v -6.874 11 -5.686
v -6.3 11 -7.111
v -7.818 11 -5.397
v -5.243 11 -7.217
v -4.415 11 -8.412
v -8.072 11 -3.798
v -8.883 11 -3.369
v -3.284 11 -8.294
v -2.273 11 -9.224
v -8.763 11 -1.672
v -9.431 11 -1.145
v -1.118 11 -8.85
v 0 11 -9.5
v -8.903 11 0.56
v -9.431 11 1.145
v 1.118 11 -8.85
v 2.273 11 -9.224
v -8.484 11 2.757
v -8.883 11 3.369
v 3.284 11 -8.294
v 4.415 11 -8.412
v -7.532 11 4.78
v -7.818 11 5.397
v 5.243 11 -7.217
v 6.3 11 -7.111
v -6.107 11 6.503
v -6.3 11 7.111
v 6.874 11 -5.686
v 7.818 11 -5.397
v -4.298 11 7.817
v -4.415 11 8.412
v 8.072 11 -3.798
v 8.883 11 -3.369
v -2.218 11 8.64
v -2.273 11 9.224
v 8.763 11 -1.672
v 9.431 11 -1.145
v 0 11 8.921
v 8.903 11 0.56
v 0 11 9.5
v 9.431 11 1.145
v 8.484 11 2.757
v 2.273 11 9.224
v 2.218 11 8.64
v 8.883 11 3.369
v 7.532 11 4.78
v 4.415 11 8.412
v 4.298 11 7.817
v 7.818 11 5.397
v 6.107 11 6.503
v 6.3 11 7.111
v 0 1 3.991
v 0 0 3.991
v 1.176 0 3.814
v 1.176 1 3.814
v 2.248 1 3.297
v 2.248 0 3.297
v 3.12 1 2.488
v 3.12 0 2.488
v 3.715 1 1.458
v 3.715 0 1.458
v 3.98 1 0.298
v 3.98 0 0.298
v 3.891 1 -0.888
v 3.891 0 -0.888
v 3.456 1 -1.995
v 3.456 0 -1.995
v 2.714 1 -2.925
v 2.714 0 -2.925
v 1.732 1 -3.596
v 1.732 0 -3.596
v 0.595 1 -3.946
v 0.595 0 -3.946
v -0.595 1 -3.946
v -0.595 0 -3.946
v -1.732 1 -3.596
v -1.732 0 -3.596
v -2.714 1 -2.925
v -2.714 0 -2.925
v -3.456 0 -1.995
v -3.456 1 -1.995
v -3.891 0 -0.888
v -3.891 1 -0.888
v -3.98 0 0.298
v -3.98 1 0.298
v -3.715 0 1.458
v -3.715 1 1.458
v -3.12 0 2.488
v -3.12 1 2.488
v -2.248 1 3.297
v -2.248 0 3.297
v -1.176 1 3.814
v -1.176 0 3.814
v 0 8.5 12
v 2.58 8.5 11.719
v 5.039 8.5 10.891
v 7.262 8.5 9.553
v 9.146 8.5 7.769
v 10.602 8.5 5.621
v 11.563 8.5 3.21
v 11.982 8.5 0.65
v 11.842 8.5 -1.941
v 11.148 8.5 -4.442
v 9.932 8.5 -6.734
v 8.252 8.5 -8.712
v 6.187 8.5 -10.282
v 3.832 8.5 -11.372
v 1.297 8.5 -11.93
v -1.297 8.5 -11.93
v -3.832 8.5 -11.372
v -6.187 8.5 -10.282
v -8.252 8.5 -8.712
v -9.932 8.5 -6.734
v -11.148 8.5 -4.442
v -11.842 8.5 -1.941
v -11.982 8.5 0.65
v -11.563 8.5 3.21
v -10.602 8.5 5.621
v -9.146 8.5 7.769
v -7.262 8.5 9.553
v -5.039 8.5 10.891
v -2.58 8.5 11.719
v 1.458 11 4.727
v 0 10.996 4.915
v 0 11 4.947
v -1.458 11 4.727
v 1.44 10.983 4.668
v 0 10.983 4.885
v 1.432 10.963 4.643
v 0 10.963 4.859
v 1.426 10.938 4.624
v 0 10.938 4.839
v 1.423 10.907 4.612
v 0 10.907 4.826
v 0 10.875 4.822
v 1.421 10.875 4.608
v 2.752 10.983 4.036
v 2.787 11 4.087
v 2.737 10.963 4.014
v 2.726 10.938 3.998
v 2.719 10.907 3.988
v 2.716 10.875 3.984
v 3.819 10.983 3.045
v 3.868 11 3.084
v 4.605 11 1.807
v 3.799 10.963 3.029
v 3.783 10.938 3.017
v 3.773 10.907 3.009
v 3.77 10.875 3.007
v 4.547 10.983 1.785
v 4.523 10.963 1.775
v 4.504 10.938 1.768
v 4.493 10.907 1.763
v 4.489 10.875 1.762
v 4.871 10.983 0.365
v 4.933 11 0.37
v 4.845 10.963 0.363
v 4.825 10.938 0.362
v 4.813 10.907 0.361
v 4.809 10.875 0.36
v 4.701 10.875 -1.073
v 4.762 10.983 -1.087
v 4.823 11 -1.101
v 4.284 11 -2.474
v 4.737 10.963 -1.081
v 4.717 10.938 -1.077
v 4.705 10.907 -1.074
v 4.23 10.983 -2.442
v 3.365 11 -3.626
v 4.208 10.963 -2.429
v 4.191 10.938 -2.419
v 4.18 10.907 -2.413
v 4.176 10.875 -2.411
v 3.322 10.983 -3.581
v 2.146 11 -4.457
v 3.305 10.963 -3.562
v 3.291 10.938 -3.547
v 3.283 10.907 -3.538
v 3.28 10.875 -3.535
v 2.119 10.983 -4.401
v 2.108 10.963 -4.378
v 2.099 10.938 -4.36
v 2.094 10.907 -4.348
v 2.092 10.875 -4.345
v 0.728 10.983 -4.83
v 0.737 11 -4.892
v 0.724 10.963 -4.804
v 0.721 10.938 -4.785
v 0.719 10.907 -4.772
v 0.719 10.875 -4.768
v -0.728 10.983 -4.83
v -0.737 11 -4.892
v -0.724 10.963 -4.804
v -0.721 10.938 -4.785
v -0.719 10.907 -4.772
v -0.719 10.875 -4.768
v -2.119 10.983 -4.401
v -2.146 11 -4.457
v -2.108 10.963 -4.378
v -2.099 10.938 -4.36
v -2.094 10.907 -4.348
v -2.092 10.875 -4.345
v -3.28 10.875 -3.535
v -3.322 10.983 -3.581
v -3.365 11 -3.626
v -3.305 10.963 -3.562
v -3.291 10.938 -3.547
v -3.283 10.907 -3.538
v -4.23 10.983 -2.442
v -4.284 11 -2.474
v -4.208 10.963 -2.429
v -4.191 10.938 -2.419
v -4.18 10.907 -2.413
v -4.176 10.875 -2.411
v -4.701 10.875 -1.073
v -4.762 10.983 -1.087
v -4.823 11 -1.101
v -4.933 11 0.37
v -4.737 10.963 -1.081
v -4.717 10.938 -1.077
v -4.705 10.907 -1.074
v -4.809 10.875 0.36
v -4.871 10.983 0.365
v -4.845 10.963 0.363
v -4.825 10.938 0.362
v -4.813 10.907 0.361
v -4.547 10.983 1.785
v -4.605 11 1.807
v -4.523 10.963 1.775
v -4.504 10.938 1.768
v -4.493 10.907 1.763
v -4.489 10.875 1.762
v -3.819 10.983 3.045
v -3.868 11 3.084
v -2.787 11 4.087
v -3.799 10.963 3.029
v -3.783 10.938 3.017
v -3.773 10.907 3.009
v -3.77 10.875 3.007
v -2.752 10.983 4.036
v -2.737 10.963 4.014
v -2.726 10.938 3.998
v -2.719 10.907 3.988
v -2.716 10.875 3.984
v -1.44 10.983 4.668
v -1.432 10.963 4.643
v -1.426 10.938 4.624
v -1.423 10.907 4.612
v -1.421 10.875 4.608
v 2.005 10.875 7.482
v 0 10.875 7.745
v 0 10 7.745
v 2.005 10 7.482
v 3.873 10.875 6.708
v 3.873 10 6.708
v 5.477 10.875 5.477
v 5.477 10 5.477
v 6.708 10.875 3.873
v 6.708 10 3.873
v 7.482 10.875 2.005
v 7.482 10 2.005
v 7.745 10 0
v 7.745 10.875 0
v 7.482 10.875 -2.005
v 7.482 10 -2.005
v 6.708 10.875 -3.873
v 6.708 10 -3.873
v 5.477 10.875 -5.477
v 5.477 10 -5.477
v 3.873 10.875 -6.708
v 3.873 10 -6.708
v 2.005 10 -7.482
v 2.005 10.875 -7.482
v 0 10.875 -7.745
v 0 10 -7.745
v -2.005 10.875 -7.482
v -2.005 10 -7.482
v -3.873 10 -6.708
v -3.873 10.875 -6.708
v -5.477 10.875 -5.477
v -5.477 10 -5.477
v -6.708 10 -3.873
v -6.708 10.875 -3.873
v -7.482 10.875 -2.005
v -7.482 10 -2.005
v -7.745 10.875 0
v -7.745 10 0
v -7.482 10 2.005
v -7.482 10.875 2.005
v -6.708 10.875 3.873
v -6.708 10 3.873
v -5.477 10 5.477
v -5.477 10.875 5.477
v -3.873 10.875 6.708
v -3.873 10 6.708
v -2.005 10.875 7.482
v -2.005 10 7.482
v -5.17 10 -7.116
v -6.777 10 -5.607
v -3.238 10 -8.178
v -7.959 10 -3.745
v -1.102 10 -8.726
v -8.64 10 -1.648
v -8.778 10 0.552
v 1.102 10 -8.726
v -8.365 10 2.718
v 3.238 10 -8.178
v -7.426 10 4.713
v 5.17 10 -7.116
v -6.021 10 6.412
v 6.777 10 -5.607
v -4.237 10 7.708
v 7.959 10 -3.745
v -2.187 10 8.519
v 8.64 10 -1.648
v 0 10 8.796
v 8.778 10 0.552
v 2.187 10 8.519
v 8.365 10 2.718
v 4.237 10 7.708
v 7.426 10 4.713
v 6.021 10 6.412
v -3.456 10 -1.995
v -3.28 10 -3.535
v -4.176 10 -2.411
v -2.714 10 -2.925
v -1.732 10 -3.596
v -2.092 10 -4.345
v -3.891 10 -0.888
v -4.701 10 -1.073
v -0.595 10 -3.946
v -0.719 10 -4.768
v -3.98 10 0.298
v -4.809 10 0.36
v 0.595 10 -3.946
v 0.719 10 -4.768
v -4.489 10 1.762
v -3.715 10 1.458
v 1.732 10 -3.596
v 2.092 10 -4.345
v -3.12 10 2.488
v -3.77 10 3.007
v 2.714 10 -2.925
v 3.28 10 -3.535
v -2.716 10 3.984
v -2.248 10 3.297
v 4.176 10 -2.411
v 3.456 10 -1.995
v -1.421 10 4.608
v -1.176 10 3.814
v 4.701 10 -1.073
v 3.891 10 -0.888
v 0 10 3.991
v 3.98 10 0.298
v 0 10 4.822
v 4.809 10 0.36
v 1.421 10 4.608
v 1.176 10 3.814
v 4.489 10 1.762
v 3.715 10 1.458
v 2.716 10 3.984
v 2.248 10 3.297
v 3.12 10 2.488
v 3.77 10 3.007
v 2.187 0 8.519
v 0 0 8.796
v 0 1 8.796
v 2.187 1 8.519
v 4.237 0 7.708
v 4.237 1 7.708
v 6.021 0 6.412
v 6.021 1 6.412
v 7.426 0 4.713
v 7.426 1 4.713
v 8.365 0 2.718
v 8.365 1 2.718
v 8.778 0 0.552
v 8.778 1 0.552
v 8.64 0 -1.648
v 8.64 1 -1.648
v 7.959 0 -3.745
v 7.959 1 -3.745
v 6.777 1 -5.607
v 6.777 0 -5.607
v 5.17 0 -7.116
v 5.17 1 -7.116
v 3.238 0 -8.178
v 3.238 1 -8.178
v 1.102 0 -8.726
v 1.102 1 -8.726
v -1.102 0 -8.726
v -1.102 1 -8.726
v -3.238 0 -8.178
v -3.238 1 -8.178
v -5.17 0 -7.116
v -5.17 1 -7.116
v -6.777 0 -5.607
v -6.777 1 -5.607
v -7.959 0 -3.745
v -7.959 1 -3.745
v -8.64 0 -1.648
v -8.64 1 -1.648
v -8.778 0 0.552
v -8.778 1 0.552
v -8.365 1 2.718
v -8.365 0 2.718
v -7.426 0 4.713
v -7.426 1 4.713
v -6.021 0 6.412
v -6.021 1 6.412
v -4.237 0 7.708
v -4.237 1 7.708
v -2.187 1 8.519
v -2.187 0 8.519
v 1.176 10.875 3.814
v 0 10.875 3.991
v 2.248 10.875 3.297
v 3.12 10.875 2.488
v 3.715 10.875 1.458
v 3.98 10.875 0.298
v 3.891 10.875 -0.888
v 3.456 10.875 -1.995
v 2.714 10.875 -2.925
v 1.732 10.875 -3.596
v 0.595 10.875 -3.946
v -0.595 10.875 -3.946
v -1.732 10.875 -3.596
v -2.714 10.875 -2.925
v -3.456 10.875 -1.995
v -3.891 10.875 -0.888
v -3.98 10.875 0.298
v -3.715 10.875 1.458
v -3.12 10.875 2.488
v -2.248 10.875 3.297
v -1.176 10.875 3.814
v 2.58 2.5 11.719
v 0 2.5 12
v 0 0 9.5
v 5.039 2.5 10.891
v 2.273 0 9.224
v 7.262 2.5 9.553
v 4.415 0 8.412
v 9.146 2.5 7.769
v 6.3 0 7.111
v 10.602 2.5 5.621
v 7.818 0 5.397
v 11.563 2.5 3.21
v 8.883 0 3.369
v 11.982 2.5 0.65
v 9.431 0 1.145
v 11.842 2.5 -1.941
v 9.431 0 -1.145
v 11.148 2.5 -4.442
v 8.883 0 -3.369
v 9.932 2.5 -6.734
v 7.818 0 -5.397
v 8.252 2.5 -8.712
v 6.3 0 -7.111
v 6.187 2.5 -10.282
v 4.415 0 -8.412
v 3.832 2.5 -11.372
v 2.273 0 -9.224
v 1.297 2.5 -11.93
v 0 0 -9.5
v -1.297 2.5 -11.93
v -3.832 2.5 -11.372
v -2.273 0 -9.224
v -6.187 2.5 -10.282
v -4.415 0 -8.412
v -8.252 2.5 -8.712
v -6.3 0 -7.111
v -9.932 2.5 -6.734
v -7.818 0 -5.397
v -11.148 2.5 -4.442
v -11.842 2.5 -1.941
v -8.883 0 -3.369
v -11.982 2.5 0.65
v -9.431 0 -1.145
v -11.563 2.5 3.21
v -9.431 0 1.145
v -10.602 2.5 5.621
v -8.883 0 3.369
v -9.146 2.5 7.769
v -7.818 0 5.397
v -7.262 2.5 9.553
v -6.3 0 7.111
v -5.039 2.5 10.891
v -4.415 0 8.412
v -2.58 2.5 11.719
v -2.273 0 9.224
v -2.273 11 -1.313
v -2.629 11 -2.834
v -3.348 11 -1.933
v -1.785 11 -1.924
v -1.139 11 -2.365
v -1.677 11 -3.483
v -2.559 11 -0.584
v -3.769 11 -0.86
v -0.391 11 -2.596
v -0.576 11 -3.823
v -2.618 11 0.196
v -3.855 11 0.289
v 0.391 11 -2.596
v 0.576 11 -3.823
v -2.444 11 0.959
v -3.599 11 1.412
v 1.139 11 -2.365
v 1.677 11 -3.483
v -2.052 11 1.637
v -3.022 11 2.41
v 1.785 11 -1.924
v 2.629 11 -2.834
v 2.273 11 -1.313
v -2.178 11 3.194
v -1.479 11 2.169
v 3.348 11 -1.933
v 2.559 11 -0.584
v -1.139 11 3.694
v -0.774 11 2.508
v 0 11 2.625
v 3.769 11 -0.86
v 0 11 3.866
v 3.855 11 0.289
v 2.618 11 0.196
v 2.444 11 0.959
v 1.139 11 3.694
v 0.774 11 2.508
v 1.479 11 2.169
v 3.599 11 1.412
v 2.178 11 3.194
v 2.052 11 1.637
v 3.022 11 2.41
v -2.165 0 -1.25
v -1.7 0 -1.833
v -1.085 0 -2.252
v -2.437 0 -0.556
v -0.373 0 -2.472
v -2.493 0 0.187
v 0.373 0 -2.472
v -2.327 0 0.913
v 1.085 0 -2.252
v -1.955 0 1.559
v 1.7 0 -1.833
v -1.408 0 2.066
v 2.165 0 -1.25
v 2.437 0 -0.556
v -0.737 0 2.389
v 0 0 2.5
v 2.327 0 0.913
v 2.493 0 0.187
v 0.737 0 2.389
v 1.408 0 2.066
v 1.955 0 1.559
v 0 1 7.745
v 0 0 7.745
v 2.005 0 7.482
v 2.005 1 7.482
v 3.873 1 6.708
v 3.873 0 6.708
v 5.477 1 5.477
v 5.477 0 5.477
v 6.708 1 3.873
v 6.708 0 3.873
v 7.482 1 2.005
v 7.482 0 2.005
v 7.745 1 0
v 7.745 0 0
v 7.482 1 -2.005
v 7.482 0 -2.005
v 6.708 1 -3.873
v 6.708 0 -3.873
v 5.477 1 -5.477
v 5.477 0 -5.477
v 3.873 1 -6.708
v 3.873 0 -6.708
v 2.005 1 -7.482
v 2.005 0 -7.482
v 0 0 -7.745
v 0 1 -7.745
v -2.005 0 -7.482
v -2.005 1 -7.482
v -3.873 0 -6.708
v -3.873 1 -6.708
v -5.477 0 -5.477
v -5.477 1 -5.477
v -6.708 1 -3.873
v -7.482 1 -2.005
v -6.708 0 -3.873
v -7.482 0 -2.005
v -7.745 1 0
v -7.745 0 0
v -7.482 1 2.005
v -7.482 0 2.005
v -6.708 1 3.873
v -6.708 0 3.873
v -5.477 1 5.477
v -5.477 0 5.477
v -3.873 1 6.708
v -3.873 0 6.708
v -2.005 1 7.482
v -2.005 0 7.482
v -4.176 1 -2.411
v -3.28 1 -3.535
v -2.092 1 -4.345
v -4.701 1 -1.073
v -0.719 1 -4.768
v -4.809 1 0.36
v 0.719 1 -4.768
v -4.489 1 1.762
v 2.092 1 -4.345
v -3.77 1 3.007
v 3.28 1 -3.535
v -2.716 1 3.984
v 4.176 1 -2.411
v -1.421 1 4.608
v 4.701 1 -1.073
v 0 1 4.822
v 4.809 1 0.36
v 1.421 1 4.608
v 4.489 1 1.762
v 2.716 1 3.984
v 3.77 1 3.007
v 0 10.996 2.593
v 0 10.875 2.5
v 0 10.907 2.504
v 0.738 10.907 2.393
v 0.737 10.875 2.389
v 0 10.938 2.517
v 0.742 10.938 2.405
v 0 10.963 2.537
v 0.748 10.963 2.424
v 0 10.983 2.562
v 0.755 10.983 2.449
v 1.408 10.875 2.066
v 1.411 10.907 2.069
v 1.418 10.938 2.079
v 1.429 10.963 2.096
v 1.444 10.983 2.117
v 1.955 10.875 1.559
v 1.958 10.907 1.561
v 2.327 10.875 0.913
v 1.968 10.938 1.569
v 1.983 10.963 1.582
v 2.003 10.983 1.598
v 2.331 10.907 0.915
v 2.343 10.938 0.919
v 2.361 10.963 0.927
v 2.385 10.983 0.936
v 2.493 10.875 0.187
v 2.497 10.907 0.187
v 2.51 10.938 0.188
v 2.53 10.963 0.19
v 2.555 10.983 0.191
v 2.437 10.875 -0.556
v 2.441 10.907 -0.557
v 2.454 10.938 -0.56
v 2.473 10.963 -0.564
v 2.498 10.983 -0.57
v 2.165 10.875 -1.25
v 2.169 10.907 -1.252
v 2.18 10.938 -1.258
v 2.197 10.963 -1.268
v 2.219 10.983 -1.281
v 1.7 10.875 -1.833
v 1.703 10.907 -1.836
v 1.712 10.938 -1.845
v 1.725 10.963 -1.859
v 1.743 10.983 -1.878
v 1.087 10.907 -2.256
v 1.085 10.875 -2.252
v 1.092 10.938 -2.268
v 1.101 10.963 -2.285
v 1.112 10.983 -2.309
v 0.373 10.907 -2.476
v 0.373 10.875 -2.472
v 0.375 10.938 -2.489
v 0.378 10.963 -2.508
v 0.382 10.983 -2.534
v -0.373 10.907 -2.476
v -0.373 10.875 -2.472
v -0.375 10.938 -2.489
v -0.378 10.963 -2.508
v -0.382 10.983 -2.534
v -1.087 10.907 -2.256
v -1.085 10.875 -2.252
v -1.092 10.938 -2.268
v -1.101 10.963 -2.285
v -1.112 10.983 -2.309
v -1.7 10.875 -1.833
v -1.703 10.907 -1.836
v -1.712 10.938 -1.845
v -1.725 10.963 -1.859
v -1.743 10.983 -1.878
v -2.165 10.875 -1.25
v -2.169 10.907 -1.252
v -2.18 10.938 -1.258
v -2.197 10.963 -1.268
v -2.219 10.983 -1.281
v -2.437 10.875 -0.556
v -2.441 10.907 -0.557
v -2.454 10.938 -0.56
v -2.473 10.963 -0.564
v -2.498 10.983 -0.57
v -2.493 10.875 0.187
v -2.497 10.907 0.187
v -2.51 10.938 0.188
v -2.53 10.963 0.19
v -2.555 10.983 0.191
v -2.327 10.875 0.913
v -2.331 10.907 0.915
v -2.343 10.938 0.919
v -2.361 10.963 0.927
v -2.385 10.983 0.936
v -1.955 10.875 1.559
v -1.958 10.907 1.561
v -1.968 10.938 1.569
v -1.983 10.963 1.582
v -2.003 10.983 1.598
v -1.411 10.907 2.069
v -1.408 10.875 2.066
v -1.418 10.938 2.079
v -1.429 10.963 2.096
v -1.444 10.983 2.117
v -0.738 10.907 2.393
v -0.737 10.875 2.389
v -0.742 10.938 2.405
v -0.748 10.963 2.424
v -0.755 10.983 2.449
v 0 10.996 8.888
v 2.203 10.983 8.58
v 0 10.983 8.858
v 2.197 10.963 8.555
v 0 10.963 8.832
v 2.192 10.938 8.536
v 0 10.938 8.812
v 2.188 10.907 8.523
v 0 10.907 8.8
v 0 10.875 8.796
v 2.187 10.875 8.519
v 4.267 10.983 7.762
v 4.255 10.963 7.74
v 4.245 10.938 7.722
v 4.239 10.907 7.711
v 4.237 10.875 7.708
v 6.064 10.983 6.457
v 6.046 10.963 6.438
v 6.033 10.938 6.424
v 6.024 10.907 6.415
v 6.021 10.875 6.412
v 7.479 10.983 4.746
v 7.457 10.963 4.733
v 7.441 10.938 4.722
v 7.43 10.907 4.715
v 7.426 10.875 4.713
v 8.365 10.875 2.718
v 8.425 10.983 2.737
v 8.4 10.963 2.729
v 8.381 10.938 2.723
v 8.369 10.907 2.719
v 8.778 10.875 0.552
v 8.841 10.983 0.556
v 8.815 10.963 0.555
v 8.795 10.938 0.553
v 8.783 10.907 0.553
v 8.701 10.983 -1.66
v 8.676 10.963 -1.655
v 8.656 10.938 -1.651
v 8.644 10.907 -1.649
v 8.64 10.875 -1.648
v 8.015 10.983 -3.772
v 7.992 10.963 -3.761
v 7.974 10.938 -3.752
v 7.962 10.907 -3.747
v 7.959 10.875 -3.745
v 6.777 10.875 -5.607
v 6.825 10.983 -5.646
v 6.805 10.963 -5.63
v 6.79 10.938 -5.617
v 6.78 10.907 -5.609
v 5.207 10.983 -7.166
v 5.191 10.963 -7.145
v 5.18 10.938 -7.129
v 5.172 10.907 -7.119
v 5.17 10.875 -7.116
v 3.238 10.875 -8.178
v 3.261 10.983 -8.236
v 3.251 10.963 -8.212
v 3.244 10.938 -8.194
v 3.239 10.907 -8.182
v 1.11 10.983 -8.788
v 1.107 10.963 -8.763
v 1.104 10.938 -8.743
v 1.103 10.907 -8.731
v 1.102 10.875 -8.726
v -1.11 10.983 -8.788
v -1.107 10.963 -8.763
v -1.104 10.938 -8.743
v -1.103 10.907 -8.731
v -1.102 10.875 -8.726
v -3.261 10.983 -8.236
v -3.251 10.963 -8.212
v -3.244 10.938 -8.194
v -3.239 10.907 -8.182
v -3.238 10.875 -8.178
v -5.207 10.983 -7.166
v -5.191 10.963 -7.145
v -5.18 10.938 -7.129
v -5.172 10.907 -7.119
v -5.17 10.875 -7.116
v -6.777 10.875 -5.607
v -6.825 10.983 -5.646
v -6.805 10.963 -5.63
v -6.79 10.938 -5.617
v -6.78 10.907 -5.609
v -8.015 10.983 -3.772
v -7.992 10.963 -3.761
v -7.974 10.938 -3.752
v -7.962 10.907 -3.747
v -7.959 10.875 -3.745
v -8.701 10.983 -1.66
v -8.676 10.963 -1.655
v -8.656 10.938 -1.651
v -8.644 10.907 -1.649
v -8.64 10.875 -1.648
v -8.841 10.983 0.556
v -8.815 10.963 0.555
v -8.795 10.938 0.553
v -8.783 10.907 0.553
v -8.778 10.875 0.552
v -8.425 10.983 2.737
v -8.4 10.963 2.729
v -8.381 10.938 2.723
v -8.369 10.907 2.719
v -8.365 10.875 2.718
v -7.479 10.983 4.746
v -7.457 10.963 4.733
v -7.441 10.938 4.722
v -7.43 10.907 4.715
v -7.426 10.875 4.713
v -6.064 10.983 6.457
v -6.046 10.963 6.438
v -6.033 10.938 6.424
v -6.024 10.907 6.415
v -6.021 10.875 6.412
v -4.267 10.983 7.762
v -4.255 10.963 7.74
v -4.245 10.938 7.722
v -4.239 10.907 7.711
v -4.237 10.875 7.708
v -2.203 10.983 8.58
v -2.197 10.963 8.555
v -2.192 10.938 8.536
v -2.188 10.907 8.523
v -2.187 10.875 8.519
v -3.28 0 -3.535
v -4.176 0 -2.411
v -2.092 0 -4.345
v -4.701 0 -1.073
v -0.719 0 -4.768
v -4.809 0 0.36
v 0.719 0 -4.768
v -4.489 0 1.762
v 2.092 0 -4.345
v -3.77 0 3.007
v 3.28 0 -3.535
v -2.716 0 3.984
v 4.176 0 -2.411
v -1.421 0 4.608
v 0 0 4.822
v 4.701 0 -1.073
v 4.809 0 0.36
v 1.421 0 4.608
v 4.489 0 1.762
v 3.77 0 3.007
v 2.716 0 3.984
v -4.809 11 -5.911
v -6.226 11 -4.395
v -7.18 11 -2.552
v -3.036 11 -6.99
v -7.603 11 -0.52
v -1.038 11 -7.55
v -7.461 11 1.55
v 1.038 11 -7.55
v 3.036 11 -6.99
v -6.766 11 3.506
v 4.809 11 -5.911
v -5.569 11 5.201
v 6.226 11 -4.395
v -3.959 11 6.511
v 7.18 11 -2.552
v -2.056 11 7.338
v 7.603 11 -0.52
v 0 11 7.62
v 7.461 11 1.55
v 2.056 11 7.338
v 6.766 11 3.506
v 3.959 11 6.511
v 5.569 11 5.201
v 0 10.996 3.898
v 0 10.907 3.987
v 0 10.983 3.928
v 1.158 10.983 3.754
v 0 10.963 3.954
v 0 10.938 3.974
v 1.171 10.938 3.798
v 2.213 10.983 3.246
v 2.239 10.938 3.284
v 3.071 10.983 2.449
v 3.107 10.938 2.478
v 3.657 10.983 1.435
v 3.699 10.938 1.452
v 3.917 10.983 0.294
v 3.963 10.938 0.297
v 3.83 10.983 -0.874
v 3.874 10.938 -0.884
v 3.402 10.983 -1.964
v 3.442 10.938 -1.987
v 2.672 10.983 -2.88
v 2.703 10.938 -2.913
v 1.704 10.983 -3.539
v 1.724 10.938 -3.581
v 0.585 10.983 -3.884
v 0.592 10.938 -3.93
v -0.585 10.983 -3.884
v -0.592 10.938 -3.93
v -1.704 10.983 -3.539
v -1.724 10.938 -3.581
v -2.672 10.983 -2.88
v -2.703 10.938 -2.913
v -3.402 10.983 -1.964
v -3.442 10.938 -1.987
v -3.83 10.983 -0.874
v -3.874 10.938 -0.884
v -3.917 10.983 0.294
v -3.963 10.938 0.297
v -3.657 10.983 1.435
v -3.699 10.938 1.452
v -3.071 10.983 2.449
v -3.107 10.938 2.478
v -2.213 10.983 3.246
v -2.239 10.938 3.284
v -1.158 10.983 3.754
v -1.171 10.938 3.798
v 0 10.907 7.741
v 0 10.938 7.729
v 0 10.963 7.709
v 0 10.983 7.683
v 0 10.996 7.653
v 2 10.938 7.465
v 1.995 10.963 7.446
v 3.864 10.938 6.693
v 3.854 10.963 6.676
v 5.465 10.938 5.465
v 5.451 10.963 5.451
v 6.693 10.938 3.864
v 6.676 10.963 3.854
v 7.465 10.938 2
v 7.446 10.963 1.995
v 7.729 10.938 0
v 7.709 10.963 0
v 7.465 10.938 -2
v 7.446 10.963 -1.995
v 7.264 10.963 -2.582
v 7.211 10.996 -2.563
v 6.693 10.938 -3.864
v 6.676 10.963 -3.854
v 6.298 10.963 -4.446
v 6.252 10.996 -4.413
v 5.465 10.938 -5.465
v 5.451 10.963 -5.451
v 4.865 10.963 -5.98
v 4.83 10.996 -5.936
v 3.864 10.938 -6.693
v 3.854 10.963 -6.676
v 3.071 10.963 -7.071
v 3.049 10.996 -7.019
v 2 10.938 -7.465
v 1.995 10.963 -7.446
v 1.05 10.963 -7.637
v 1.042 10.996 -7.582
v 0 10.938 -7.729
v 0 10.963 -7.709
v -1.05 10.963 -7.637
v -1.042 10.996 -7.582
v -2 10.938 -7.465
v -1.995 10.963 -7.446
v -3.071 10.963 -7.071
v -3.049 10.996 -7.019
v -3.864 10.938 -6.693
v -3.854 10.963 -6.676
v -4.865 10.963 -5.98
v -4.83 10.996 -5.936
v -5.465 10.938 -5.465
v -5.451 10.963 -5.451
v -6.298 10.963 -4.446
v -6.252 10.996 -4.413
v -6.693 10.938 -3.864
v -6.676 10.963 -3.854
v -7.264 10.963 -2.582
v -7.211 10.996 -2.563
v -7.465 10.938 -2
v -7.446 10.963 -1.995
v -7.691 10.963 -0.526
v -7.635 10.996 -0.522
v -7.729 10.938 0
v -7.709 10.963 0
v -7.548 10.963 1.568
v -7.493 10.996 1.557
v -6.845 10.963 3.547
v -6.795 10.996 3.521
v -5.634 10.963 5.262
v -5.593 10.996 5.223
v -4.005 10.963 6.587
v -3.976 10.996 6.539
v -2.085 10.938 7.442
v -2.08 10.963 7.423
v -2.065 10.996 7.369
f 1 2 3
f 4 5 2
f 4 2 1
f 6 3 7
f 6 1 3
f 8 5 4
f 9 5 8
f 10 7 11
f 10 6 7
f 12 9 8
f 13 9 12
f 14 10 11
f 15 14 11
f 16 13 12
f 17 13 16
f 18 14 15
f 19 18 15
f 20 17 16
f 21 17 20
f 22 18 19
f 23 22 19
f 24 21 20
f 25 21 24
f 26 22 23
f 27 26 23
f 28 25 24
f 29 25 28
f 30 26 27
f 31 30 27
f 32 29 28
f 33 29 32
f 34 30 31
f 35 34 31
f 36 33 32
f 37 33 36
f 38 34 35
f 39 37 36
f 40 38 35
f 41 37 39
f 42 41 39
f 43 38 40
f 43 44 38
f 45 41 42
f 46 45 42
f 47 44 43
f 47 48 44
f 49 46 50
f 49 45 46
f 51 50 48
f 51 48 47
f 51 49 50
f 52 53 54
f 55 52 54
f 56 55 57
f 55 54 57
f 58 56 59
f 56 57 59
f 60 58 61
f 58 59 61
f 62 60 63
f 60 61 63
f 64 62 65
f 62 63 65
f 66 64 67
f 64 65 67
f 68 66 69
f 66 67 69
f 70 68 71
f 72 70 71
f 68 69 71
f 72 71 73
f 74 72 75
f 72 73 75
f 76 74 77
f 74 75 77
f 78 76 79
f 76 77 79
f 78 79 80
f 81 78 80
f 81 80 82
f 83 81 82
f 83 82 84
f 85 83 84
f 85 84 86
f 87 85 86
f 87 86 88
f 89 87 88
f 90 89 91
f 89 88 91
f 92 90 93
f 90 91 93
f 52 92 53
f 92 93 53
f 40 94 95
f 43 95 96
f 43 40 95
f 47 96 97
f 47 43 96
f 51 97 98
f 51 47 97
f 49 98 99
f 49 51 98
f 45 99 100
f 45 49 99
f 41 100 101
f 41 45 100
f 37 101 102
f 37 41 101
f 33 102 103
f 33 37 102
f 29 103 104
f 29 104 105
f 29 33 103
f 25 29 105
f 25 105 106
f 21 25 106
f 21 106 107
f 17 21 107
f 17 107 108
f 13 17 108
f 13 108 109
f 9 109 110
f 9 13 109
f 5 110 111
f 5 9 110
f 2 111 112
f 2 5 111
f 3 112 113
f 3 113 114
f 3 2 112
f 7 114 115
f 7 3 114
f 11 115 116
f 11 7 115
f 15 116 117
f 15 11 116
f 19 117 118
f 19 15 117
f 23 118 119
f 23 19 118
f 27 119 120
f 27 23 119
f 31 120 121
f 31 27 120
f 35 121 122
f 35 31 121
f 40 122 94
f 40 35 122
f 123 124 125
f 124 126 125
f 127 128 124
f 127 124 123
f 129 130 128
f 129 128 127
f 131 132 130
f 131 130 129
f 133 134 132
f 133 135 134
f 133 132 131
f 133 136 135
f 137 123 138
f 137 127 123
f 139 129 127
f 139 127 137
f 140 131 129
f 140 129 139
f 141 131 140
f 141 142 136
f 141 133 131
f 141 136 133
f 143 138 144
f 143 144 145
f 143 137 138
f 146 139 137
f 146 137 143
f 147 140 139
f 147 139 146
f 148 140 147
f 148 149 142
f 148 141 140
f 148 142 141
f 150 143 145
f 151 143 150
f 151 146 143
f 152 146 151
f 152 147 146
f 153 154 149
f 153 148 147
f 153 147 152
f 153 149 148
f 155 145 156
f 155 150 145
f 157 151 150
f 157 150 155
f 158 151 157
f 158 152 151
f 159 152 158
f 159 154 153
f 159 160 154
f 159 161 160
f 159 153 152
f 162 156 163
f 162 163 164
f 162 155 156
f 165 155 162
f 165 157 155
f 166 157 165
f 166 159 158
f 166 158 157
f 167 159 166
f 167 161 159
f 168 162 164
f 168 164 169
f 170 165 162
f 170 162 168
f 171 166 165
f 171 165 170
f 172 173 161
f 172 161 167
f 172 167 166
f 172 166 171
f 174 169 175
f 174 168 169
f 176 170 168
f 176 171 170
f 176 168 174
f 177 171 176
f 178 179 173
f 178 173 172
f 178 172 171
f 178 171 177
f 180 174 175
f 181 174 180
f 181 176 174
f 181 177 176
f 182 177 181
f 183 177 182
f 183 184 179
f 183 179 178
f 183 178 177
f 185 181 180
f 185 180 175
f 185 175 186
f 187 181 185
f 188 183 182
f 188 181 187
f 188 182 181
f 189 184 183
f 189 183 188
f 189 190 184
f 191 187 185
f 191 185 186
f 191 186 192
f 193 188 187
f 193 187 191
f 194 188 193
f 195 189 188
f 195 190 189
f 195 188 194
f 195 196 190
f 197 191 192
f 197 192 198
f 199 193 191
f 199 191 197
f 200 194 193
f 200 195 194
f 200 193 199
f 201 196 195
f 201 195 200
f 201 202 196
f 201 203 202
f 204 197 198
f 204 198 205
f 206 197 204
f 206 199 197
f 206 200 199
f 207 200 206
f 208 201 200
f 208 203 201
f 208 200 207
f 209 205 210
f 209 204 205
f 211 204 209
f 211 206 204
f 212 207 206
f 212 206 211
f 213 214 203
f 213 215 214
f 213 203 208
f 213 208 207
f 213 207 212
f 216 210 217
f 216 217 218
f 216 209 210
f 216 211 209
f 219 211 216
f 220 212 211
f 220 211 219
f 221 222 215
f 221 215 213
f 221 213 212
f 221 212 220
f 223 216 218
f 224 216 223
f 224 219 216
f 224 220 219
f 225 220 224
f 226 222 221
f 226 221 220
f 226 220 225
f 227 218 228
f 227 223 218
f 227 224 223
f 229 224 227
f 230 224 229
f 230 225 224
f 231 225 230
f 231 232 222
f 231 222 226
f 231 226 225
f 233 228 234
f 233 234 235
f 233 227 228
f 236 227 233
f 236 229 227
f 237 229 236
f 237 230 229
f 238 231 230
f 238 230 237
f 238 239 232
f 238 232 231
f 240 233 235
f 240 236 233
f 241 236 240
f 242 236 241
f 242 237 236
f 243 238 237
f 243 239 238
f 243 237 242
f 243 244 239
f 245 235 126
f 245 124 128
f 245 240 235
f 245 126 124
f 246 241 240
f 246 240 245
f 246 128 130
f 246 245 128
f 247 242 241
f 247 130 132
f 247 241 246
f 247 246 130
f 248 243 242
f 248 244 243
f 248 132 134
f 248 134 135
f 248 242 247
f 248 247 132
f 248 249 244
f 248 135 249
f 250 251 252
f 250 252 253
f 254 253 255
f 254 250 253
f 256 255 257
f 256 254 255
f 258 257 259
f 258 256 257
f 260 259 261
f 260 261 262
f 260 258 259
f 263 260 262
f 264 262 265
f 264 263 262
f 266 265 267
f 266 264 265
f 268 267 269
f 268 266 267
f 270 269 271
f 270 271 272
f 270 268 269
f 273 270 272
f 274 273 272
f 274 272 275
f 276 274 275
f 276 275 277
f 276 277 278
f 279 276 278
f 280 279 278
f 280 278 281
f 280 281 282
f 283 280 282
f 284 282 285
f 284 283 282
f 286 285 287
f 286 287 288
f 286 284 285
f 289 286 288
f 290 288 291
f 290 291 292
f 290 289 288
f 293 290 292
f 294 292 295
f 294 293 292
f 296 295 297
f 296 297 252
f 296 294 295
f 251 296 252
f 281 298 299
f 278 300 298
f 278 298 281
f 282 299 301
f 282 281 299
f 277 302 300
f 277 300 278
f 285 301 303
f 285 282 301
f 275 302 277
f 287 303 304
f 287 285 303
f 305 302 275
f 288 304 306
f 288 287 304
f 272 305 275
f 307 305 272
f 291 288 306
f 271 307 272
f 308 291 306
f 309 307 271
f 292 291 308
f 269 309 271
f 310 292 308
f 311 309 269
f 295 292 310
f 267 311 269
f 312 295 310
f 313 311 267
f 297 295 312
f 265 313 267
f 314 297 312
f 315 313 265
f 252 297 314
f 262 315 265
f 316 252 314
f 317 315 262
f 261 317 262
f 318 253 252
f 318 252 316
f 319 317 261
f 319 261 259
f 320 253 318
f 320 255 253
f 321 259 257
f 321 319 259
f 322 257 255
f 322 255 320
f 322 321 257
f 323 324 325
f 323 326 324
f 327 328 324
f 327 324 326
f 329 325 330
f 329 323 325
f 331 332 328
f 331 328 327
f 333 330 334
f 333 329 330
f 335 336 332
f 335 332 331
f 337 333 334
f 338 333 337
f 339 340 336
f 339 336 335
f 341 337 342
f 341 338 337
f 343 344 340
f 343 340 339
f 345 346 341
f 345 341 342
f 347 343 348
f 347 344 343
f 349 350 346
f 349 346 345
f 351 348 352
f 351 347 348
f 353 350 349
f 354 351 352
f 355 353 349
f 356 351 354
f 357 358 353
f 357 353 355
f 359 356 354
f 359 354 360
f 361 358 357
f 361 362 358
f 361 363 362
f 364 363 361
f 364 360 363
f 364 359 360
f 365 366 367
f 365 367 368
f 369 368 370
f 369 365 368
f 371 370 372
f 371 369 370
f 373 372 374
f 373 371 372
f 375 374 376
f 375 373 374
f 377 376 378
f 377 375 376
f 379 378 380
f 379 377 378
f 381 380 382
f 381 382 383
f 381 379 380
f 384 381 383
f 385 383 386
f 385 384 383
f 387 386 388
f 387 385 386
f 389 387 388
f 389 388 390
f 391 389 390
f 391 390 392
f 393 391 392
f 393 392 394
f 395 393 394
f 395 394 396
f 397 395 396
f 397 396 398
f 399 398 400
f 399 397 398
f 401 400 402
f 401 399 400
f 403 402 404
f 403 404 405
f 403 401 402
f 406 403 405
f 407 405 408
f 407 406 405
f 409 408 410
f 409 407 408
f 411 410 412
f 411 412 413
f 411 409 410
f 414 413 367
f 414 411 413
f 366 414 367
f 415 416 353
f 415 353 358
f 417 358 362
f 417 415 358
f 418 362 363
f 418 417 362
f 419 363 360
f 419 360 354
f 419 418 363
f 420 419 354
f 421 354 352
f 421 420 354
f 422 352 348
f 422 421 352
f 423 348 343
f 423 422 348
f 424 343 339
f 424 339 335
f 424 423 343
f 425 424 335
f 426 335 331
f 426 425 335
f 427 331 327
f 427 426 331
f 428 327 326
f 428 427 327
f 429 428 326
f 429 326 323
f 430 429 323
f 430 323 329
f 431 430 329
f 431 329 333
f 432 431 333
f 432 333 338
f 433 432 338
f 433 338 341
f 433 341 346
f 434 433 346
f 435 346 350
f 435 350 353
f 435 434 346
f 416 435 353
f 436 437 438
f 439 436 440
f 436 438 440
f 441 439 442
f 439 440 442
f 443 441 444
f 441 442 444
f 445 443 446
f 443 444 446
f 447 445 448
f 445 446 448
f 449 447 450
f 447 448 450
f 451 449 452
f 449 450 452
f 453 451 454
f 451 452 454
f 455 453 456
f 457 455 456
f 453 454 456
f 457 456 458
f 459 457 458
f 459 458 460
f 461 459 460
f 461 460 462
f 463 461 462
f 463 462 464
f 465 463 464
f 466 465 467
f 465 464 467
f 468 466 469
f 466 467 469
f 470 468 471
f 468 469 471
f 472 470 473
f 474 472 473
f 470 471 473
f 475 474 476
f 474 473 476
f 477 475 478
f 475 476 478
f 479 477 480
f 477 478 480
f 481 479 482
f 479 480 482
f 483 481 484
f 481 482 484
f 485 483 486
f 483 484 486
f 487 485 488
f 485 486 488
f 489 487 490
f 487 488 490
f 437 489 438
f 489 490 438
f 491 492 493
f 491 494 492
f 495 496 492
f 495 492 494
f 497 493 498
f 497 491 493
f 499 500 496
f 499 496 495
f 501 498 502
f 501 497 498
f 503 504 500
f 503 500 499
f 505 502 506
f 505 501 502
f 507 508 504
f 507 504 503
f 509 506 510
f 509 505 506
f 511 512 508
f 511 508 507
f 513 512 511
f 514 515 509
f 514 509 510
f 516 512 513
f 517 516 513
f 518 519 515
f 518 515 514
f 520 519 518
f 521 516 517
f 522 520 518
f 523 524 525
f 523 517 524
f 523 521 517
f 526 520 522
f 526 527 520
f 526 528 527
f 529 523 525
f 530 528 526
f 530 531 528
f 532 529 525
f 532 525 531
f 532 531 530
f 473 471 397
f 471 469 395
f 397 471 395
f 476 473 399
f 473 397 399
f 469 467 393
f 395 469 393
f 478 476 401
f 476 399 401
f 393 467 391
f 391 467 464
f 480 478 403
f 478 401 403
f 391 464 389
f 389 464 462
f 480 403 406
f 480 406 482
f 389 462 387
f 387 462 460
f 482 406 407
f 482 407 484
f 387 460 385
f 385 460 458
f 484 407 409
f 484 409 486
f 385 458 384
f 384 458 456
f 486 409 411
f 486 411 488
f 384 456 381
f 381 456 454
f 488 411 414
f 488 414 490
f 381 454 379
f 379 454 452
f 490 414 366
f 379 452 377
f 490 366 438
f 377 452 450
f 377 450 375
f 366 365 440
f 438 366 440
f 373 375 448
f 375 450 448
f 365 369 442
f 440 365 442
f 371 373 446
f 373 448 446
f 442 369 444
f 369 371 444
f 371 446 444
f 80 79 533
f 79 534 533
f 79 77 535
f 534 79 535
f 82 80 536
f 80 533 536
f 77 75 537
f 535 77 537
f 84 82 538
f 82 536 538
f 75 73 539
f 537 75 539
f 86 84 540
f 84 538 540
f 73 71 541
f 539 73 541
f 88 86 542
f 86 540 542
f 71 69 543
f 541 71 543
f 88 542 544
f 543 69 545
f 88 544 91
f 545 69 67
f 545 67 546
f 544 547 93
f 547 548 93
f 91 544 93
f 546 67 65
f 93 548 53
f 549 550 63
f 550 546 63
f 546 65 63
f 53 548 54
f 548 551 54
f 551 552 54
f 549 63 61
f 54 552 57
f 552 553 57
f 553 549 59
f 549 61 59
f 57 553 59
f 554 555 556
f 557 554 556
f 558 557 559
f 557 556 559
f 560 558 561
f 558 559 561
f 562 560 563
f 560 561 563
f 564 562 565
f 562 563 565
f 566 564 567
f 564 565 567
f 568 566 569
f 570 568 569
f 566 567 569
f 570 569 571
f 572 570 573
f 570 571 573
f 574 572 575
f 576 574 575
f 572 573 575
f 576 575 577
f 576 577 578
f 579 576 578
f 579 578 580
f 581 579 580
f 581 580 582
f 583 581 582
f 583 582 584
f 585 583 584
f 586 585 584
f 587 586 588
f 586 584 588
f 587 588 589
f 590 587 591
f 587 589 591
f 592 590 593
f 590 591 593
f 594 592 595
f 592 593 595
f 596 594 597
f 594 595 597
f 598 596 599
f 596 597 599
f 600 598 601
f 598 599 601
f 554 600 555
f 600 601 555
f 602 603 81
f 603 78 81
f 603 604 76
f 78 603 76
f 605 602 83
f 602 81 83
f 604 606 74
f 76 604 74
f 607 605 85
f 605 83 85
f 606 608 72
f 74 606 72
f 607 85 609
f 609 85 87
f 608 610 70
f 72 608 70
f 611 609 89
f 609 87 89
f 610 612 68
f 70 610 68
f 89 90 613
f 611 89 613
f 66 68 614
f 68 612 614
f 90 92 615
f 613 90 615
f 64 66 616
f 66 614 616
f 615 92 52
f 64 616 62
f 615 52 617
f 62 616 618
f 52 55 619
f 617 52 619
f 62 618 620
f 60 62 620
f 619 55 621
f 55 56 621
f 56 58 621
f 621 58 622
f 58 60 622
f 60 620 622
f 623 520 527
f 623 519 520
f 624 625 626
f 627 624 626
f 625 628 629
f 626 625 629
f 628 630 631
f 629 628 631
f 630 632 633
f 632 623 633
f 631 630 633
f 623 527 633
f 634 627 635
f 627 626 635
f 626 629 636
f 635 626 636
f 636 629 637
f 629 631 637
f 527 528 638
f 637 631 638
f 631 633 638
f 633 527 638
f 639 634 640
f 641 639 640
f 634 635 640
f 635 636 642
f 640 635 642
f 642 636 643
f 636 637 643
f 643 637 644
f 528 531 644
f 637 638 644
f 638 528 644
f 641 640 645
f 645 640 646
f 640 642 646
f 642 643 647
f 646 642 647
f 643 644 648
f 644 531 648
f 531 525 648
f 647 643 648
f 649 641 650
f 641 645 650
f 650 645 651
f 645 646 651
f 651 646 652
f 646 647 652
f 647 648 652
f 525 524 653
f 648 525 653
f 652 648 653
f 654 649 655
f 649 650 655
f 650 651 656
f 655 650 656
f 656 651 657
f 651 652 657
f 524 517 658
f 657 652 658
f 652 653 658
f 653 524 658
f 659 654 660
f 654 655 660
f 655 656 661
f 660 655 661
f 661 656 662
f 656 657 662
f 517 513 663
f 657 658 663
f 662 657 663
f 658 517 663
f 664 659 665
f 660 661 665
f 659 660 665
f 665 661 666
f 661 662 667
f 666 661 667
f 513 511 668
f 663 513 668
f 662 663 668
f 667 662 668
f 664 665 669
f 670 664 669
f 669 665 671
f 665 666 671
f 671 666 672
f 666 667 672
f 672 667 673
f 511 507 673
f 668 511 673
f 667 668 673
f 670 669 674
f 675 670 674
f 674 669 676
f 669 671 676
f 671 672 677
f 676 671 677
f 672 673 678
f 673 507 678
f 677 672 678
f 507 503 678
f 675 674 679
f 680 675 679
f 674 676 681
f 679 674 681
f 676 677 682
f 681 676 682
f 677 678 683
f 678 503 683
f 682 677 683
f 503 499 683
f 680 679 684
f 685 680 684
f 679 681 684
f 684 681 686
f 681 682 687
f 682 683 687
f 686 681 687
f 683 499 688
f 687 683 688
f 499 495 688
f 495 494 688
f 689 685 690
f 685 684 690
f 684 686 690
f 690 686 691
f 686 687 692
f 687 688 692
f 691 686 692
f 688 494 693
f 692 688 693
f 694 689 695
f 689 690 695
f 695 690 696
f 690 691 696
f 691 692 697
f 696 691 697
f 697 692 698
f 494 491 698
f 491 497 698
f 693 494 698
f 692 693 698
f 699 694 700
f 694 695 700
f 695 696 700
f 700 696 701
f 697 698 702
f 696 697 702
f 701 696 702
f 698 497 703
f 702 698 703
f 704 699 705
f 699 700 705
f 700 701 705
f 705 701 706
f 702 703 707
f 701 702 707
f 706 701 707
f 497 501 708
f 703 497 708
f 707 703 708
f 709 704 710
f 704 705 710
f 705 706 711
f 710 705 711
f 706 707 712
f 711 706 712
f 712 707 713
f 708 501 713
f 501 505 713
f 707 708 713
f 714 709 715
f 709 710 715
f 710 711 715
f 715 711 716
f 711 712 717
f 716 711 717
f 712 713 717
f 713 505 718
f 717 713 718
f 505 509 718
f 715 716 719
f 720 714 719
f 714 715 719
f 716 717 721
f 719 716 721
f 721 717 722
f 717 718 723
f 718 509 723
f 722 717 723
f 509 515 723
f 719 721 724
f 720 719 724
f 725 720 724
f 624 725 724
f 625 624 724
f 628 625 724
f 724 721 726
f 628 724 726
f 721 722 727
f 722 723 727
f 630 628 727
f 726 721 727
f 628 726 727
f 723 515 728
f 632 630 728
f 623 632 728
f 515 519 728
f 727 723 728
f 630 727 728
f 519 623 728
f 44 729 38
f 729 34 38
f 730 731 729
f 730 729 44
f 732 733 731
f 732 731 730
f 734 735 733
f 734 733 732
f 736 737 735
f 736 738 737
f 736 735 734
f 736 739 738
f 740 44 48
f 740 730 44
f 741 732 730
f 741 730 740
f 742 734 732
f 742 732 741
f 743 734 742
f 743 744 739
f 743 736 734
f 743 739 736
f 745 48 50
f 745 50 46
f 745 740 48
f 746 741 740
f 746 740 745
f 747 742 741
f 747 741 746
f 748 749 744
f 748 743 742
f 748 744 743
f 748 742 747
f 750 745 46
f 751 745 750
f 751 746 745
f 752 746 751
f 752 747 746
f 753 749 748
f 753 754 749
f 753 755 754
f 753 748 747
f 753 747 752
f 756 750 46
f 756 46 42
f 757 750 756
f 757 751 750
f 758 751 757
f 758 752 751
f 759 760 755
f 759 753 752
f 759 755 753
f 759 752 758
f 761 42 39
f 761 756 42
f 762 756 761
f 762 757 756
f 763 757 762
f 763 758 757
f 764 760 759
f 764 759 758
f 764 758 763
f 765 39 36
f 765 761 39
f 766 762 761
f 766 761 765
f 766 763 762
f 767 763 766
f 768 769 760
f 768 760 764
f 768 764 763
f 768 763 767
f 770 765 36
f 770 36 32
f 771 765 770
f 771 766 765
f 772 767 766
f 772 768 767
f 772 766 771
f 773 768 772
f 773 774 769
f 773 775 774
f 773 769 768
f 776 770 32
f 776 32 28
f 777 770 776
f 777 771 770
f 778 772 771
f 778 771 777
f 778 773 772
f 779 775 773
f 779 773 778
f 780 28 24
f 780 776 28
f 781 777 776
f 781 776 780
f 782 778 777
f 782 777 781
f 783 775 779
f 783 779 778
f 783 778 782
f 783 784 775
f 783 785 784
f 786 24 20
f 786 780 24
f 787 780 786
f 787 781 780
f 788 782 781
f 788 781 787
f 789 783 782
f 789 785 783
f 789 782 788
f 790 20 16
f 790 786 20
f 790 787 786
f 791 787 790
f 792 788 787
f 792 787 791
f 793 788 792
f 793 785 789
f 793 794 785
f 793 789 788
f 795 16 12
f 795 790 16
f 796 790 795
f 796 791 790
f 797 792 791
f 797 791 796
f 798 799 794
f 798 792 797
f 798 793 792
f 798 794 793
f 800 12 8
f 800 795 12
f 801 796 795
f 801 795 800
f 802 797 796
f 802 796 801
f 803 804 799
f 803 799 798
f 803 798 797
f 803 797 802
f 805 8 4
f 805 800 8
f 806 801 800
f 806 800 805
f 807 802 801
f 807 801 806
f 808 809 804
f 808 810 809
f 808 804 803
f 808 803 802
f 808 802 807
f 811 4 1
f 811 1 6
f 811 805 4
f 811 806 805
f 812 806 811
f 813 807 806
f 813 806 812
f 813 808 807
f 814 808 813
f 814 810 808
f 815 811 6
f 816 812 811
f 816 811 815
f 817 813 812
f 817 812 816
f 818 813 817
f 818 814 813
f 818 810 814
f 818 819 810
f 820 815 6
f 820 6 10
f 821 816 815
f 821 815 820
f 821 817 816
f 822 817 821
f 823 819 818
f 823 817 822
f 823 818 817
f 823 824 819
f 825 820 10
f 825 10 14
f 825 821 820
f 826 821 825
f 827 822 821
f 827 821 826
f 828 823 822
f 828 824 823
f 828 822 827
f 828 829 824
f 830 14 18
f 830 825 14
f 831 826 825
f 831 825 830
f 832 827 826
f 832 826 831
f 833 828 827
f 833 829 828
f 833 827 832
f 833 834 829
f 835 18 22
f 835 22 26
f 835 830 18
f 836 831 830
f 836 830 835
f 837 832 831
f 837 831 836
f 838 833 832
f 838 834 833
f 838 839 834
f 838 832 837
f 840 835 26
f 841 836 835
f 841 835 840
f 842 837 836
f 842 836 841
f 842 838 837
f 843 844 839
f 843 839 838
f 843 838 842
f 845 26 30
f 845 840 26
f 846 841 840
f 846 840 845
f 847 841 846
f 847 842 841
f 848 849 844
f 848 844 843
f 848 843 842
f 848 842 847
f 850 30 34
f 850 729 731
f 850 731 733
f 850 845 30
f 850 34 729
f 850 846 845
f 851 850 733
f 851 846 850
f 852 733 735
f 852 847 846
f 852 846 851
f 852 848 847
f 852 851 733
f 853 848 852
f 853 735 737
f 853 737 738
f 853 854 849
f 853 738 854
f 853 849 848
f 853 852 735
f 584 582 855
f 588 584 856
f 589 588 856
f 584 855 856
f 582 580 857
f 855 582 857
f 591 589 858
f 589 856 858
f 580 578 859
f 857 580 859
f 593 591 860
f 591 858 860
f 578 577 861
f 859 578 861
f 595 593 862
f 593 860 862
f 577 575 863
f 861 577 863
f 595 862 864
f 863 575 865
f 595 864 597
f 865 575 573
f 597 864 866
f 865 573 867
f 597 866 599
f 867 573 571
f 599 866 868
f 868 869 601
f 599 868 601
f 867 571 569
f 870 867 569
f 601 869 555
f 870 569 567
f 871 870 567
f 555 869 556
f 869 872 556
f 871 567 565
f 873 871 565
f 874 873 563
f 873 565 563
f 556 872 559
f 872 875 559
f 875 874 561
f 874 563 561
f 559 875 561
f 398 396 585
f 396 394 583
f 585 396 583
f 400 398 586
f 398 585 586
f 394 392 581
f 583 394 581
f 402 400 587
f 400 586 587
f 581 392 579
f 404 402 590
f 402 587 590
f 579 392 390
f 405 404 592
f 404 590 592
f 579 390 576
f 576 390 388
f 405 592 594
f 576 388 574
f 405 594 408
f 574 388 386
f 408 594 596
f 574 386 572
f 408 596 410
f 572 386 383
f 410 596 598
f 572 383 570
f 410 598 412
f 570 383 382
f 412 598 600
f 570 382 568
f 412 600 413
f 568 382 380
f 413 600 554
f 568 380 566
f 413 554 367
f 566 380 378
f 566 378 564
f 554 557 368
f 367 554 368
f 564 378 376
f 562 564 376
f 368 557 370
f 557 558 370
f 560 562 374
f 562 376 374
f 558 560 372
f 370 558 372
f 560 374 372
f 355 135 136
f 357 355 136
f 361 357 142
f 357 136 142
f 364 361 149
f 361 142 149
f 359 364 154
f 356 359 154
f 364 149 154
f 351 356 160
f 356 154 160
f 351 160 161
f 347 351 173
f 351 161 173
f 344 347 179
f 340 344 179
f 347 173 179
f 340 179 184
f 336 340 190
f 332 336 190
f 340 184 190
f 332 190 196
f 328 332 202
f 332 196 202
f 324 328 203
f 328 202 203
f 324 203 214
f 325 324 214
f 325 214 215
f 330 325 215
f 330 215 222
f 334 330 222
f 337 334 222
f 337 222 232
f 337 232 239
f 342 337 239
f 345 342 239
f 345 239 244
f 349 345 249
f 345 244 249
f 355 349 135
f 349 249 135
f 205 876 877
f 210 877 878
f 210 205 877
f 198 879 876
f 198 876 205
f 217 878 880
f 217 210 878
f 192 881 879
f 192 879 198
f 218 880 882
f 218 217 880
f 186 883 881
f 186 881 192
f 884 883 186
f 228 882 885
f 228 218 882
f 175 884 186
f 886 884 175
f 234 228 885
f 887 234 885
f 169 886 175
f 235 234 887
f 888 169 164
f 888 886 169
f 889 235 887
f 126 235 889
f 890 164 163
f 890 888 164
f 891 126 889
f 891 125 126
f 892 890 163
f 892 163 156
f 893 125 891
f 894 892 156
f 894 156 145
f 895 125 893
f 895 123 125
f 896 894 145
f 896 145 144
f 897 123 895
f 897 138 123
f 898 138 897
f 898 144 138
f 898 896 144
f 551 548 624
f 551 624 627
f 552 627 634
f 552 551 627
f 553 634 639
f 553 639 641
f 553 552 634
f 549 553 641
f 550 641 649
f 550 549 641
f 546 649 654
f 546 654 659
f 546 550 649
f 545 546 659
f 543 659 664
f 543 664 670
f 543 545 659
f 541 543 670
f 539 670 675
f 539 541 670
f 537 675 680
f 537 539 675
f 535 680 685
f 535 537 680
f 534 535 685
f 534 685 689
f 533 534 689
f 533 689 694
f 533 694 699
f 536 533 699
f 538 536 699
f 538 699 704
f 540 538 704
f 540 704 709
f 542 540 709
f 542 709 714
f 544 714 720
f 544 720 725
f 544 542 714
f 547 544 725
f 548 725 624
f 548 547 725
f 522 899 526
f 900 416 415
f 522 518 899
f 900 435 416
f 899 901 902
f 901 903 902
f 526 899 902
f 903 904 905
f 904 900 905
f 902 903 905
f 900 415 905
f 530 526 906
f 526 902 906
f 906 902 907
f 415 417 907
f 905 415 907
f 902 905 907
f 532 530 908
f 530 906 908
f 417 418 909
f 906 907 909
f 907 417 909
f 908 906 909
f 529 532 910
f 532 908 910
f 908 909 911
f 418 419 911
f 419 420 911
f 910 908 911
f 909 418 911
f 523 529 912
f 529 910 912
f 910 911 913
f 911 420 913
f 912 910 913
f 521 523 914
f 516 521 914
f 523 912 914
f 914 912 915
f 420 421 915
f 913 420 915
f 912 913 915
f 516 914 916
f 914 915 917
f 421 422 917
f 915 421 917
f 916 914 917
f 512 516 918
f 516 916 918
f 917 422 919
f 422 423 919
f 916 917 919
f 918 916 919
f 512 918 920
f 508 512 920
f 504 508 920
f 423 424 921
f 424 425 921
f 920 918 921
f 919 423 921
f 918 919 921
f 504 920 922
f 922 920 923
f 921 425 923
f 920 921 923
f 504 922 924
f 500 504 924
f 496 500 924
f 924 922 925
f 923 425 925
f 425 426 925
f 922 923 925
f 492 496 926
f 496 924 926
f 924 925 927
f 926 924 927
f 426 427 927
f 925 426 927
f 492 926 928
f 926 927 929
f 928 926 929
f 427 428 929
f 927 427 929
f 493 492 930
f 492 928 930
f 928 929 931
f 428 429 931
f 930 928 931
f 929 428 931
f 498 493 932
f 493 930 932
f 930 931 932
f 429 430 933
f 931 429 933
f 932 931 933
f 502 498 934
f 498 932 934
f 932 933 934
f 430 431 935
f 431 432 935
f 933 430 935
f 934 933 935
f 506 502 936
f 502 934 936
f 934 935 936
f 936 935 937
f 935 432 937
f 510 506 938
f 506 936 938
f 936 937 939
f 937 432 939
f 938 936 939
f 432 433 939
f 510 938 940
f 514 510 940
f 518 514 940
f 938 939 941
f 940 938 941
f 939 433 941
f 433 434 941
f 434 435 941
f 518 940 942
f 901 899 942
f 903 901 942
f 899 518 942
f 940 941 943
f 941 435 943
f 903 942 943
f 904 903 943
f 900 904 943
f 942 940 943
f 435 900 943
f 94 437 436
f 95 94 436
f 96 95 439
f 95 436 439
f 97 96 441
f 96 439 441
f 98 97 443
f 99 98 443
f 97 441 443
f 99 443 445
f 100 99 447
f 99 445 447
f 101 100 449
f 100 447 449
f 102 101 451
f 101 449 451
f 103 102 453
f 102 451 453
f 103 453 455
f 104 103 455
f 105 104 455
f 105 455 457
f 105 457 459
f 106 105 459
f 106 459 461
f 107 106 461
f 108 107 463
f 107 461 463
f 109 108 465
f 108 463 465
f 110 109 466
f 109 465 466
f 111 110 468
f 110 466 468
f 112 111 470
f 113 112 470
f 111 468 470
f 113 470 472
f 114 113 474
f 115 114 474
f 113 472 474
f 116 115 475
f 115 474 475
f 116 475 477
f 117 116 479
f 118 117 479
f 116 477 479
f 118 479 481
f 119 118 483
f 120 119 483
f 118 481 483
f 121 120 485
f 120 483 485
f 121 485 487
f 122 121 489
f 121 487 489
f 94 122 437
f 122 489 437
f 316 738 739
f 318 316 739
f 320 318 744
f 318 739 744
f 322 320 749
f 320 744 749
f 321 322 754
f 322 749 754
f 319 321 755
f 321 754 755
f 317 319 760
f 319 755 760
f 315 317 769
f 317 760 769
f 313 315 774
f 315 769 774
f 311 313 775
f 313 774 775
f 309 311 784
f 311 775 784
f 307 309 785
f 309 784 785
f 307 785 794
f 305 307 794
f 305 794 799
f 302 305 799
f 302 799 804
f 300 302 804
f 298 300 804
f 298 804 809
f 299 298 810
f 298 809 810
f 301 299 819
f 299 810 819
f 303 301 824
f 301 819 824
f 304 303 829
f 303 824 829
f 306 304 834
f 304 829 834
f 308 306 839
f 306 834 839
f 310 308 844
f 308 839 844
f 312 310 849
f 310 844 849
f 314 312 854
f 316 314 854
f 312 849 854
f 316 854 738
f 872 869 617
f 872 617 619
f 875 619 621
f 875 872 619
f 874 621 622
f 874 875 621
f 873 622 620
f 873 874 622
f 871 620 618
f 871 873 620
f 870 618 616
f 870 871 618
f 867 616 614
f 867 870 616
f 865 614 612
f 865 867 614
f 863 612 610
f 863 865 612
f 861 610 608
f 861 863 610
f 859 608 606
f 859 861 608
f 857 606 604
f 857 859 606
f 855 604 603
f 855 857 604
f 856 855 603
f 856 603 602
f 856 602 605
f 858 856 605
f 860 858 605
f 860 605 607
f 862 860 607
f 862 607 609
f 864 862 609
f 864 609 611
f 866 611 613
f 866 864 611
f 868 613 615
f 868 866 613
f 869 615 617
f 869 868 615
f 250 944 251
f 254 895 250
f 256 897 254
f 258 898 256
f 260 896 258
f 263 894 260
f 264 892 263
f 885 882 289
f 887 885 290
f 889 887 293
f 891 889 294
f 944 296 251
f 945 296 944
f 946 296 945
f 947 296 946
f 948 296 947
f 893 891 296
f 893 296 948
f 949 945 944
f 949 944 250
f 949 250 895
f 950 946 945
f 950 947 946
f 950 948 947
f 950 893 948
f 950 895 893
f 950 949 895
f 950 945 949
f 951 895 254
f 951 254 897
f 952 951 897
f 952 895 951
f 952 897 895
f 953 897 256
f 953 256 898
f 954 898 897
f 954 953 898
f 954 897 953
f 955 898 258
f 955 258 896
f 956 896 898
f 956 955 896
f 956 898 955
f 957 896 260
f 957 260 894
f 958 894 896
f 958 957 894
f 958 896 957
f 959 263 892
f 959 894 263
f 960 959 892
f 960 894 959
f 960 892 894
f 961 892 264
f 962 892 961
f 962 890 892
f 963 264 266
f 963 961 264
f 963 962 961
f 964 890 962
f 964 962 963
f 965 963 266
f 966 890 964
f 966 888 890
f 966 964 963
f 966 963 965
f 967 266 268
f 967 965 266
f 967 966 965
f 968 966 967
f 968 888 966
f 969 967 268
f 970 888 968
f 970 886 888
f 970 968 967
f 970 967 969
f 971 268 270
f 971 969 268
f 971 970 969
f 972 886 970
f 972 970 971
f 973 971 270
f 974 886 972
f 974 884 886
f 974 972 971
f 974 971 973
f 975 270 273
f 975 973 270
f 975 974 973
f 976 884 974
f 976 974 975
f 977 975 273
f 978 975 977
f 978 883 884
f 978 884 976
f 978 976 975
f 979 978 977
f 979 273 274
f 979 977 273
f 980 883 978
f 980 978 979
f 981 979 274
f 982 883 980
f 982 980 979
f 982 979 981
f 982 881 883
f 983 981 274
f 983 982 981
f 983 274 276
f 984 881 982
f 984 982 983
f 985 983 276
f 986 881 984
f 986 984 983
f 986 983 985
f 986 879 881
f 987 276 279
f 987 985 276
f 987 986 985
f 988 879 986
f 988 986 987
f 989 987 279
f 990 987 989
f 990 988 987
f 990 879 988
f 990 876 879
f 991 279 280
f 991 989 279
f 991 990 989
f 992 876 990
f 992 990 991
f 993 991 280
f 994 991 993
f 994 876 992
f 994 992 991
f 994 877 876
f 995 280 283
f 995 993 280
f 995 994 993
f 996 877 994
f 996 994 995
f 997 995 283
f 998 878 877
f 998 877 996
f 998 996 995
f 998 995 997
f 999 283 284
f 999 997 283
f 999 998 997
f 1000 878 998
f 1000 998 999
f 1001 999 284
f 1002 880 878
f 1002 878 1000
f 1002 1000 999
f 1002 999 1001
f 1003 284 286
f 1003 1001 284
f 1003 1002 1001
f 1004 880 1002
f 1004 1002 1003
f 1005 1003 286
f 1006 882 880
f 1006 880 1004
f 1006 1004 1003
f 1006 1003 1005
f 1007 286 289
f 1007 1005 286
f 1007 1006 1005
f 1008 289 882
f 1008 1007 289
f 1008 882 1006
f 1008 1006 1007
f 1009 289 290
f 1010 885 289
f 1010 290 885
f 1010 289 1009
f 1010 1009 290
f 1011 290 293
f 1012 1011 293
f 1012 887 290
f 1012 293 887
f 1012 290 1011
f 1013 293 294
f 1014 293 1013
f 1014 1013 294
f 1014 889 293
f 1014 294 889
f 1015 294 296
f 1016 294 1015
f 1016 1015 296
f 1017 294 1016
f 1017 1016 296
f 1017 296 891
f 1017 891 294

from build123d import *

# Parameters (mm, degrees)
SKETCH1_R           = 12
SKETCH1_R_2         = 2.5
BOSS_EXTRUDE1_DEPTH = 11
SKETCH3_R           = 8.795689967
SKETCH3_R_2         = 7.745486604
SKETCH3_R_3         = 4.822057037
SKETCH3_R_4         = 3.990813244
CUT_EXTRUDE1_DEPTH  = 1
CHAMFER1_SIZE       = 2.5
FILLET2_R           = 0.125


with BuildPart() as part:
    # Sketch1 → Boss-Extrude1 (new body)
    with BuildSketch(Plane(origin=(0, 0, 0), x_dir=(1, 0, 0), z_dir=(0, 1, 0))):
        with Locations(Location((0, 0, 0), (0, 0, 270))):
            Circle(SKETCH1_R)
        with Locations(Location((0, 0, 0), (0, 0, 270))):
            Circle(SKETCH1_R_2, mode=Mode.SUBTRACT)
    extrude(amount=BOSS_EXTRUDE1_DEPTH)

    # Sketch3 → Cut-Extrude1 (cut)
    # profile 1 of 2: a face of its own
    with BuildSketch(Plane(origin=(0, 11, 0), x_dir=(1, 0, 0), z_dir=(0, 1, 0))):
        with Locations(Location((0, 0, 0), (0, 0, 270))):
            Circle(SKETCH3_R)
        with Locations(Location((0, 0, 0), (0, 0, 270))):
            Circle(SKETCH3_R_2, mode=Mode.SUBTRACT)
    # profile 2 of 2: a face of its own
    with BuildSketch(Plane(origin=(0, 11, 0), x_dir=(1, 0, 0), z_dir=(0, 1, 0))):
        with Locations(Location((0, 0, 0), (0, 0, 270))):
            Circle(SKETCH3_R_3)
        with Locations(Location((0, 0, 0), (0, 0, 270))):
            Circle(SKETCH3_R_4, mode=Mode.SUBTRACT)
    cut_extrude1 = extrude(amount=-CUT_EXTRUDE1_DEPTH, mode=Mode.SUBTRACT)

    # Chamfer1
    chamfer1_edges = [part.edges().sort_by_distance(p)[0] for p in [
        (0, 0, -12),
        (0, 11, -12),
    ]]
    chamfer(chamfer1_edges, length=CHAMFER1_SIZE)

    # Fillet2
    fillet2_edges = [part.edges().sort_by_distance(p)[0] for p in [
        (0, 11, -3.990813244),
        (0, 11, -4.822057037),
        (0, 11, -7.745486604),
        (0, 11, -8.795689967),
        (0, 11, -2.5),
    ]]
    fillet(fillet2_edges, radius=FILLET2_R)

    # Mirror3: Cut-Extrude1 across plane
    add(cut_extrude1.mirror(Plane.ZX.offset(5.5)), mode=Mode.SUBTRACT)


solid = part.part
